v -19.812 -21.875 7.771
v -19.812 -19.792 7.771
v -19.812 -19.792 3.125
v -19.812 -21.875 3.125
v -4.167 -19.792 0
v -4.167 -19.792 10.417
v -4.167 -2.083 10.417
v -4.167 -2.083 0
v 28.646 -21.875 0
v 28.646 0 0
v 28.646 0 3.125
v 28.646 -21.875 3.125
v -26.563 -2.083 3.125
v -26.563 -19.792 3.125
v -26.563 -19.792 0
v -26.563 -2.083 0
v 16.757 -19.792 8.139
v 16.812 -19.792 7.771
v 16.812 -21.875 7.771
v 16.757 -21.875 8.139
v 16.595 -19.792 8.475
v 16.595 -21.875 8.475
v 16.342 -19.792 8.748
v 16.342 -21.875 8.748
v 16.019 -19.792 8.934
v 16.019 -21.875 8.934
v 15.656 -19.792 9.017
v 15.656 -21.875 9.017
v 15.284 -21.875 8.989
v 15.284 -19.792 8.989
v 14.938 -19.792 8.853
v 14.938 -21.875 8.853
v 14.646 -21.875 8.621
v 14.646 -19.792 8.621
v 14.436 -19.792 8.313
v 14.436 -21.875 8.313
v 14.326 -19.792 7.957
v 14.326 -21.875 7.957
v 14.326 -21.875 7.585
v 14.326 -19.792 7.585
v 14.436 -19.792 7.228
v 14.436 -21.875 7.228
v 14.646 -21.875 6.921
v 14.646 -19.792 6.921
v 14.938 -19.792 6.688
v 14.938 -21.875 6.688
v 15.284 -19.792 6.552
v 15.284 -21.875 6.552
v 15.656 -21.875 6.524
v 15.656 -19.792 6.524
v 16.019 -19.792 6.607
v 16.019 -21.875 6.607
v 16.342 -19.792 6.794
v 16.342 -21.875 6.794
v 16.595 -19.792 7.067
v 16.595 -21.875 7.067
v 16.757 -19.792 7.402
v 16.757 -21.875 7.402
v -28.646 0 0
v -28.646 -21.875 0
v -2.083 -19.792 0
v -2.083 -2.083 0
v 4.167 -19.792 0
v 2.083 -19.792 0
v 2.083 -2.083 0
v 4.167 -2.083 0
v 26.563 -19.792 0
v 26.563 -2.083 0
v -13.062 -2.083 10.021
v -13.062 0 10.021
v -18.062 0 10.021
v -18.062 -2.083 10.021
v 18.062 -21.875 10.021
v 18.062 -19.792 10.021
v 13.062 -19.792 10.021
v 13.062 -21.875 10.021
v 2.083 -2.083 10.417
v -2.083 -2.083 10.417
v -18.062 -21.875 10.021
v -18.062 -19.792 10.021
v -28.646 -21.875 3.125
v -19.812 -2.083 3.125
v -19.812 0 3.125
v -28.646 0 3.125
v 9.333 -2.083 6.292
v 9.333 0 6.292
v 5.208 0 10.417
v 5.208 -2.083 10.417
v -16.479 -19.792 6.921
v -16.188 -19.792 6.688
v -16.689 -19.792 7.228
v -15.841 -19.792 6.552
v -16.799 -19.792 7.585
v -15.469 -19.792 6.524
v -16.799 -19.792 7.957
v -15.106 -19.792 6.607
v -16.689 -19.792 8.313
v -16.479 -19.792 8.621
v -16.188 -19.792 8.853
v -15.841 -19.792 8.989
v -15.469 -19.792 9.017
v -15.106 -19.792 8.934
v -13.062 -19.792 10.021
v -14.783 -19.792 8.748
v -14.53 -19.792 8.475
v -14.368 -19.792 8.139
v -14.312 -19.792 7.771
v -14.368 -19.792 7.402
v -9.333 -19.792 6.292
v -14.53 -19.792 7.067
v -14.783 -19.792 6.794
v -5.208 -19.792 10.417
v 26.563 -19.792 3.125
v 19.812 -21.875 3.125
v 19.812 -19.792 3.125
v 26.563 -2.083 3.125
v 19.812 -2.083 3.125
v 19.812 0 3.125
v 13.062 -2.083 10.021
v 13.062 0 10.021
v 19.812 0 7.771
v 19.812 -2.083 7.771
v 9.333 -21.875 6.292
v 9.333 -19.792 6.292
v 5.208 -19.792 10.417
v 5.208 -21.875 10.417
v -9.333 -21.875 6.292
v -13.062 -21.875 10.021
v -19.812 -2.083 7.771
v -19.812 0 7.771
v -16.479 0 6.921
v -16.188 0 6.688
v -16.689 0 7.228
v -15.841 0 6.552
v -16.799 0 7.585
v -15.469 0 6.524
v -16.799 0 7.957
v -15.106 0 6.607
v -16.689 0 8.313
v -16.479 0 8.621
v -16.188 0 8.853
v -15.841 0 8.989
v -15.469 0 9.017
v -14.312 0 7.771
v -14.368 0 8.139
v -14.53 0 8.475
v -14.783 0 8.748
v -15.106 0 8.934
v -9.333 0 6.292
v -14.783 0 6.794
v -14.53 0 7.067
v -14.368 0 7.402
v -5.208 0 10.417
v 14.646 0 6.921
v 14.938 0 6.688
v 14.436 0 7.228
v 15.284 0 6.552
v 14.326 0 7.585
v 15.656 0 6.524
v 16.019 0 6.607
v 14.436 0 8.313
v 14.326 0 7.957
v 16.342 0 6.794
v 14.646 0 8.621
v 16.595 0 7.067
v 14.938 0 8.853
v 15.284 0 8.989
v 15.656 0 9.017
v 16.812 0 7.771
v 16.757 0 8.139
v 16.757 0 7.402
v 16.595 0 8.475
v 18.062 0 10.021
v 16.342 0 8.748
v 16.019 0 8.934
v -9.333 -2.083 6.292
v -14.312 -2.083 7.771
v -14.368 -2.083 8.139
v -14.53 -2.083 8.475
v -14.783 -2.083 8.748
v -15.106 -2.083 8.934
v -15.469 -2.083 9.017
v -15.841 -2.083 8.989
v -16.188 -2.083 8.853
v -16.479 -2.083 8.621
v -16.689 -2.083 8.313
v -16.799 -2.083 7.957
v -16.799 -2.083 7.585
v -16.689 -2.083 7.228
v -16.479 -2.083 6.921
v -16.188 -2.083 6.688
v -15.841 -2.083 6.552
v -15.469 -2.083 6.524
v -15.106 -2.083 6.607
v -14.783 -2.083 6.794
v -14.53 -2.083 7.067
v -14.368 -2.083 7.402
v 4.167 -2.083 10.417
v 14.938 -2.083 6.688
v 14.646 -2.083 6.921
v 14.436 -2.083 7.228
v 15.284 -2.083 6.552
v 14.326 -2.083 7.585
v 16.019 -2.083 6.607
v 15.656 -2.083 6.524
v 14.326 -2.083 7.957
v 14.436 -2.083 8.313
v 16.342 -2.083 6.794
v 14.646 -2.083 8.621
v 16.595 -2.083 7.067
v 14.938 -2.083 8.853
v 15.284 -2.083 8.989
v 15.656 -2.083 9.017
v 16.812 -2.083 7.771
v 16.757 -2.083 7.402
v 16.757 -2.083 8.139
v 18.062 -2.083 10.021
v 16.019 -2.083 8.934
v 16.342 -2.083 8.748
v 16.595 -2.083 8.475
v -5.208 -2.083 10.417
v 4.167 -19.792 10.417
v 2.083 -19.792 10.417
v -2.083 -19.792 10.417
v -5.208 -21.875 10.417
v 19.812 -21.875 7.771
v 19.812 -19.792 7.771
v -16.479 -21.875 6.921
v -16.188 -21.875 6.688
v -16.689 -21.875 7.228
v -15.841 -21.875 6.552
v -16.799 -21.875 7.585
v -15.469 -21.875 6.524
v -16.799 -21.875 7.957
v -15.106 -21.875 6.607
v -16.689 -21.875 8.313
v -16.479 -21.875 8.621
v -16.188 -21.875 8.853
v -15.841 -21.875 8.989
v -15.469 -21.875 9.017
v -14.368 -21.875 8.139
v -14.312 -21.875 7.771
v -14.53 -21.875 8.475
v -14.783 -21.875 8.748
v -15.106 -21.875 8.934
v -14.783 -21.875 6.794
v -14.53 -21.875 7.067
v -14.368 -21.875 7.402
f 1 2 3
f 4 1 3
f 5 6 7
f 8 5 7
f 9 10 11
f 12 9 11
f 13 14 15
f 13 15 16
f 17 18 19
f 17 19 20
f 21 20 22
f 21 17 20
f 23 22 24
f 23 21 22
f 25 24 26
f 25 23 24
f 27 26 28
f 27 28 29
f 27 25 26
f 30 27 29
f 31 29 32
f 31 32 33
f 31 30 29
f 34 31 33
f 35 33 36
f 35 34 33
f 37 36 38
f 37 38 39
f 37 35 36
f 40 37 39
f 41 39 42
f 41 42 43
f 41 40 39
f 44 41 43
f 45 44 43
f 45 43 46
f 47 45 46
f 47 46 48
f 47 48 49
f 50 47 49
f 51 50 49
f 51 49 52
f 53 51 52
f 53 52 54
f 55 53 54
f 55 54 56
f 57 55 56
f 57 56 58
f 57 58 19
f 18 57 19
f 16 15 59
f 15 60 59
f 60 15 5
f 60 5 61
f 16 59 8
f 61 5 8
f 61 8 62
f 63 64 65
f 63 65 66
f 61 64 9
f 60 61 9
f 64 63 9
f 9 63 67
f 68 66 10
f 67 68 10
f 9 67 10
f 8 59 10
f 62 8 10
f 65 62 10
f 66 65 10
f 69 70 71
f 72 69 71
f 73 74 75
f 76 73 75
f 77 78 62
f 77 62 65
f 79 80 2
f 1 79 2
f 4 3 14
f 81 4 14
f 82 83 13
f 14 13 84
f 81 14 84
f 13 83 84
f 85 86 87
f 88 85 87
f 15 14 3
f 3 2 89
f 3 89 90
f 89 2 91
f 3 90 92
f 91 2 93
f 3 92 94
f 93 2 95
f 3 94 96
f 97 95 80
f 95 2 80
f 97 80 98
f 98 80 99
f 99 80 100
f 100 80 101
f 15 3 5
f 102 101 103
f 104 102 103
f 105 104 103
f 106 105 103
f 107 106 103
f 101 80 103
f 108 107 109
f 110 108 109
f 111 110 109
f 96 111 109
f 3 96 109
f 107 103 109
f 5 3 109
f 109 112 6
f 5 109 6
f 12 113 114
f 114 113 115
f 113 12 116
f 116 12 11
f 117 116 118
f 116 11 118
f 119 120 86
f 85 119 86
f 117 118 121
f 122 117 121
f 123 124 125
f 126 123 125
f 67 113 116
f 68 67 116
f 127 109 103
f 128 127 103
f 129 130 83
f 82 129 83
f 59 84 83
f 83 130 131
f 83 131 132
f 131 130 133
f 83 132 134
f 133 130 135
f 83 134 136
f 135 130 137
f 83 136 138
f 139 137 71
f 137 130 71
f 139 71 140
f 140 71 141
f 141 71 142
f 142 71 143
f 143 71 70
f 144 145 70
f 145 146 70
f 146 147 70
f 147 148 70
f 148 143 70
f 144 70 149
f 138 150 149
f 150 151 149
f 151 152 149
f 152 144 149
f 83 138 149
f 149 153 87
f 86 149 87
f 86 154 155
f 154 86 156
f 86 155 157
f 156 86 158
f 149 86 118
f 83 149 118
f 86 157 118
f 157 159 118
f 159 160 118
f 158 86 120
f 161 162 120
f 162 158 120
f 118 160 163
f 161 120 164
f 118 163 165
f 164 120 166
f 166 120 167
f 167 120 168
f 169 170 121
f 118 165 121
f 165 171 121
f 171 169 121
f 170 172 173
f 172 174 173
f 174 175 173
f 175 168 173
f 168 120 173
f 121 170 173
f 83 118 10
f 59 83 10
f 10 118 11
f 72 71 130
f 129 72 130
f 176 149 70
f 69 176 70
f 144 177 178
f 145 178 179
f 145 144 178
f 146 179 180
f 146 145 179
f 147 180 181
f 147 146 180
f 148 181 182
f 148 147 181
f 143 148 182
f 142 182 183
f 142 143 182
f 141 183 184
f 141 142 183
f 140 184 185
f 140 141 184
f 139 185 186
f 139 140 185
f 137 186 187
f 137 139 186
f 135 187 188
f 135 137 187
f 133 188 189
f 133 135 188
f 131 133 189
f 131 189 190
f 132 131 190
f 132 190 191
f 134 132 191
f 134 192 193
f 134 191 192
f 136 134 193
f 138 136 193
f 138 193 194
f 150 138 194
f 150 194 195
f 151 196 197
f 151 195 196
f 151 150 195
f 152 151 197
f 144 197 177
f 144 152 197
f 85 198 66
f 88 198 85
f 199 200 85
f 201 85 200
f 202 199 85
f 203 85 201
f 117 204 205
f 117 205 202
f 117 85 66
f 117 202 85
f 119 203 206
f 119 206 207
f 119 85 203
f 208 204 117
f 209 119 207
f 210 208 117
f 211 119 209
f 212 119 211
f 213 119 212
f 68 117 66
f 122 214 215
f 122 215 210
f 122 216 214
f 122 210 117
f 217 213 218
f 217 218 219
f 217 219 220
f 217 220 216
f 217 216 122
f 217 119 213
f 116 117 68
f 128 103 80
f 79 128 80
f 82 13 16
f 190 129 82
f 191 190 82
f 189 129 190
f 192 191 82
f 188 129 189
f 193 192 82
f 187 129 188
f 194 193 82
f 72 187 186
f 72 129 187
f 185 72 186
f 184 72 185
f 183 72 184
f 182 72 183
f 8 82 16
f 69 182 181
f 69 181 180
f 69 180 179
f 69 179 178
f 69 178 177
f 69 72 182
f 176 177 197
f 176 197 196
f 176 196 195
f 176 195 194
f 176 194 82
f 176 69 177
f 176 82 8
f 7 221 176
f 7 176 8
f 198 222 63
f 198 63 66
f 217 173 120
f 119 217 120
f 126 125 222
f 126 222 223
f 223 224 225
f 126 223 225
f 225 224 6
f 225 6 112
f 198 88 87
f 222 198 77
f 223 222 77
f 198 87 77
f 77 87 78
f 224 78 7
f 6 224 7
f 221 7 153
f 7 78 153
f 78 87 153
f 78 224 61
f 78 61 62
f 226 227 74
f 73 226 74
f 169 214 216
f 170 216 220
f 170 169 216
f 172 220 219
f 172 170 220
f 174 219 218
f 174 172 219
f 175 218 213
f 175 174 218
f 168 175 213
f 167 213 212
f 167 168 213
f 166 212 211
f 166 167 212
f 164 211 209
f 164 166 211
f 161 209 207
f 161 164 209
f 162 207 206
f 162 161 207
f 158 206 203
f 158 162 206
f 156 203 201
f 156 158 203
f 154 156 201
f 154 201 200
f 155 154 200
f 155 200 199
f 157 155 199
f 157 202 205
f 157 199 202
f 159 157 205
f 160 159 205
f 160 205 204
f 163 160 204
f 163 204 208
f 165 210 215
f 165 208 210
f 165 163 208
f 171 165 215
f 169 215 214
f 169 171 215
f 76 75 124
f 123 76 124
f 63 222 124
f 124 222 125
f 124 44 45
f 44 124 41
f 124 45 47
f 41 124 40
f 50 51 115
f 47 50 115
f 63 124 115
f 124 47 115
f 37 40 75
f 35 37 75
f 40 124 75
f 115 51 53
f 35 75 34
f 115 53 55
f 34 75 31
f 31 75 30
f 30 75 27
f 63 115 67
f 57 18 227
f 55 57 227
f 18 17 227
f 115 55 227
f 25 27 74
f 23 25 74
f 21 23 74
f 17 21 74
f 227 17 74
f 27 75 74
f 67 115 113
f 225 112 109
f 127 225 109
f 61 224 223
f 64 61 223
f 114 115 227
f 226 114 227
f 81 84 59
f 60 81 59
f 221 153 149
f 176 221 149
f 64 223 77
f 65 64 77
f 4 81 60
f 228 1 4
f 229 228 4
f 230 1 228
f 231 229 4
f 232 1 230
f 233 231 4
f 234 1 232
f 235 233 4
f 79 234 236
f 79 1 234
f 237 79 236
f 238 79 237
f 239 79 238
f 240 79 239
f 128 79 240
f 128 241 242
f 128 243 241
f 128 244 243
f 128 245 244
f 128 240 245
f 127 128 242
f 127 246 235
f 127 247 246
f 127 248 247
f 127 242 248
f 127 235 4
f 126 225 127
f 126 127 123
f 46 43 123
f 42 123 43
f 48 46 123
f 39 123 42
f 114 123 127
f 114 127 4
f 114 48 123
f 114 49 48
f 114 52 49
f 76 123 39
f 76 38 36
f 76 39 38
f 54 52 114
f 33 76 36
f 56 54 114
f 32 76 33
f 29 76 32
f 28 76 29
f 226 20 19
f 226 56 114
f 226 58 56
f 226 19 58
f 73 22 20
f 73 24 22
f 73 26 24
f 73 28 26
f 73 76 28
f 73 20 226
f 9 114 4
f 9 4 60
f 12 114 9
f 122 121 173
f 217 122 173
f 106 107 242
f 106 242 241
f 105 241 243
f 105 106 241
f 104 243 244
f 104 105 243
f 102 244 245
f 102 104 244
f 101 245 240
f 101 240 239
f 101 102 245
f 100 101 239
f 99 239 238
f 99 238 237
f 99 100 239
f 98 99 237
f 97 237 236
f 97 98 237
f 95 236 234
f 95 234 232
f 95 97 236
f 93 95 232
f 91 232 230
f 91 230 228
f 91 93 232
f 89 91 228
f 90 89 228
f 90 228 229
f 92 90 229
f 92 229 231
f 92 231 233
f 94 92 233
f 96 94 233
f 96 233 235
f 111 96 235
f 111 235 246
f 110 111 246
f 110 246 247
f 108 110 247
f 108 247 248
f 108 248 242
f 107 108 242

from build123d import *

# Parameters (mm, degrees)
F0_R     = 1.25
F1_DEPTH = 21.875
F2_W     = 22.395833
F2_H     = 17.708334
F2_W_2   = 4.166666
F3_DEPTH = 10.417667


with BuildPart() as f1:
    # F0 (on Front) → F1 (new body)
    with BuildSketch(Plane.XZ):
        Polygon((-28.645833, 0), (0, 0), (28.645833, 0), (28.645833, 3.125), (19.8125, 3.125), (12.5, 3.125), (9.333333, 6.291667), (5.208333, 10.416667), (0, 10.416667), (-5.208333, 10.416667), (-9.333333, 6.291667), (-12.5, 3.125), (-19.8125, 3.125), (-28.645833, 3.125), align=None)
        Polygon((12.5, 3.125), (19.8125, 3.125), (19.8125, 7.770833), (18.0625, 10.020833), (13.0625, 10.020833), (9.333333, 6.291667), align=None)
        with Locations((15.5625, 7.770833)):
            Circle(F0_R, mode=Mode.SUBTRACT)
        Polygon((-19.8125, 7.770833), (-19.8125, 3.125), (-12.5, 3.125), (-9.333333, 6.291667), (-13.0625, 10.020833), (-18.0625, 10.020833), align=None)
        with Locations((-15.5625, 7.770833)):
            Circle(F0_R, mode=Mode.SUBTRACT)
    extrude(amount=F1_DEPTH)

    # F2 (on face) → F3 (cut, through all)
    with BuildSketch(Plane.XY.offset(10.416667)):
        with Locations((-15.364584, -10.9375)):
            Rectangle(F2_W, F2_H)
        with Locations((15.364584, -10.9375)):
            Rectangle(F2_W, F2_H)
        with Locations((0, -10.9375)):
            Rectangle(F2_W_2, F2_H)
    extrude(amount=-F3_DEPTH, mode=Mode.SUBTRACT)


solid = f1.part
